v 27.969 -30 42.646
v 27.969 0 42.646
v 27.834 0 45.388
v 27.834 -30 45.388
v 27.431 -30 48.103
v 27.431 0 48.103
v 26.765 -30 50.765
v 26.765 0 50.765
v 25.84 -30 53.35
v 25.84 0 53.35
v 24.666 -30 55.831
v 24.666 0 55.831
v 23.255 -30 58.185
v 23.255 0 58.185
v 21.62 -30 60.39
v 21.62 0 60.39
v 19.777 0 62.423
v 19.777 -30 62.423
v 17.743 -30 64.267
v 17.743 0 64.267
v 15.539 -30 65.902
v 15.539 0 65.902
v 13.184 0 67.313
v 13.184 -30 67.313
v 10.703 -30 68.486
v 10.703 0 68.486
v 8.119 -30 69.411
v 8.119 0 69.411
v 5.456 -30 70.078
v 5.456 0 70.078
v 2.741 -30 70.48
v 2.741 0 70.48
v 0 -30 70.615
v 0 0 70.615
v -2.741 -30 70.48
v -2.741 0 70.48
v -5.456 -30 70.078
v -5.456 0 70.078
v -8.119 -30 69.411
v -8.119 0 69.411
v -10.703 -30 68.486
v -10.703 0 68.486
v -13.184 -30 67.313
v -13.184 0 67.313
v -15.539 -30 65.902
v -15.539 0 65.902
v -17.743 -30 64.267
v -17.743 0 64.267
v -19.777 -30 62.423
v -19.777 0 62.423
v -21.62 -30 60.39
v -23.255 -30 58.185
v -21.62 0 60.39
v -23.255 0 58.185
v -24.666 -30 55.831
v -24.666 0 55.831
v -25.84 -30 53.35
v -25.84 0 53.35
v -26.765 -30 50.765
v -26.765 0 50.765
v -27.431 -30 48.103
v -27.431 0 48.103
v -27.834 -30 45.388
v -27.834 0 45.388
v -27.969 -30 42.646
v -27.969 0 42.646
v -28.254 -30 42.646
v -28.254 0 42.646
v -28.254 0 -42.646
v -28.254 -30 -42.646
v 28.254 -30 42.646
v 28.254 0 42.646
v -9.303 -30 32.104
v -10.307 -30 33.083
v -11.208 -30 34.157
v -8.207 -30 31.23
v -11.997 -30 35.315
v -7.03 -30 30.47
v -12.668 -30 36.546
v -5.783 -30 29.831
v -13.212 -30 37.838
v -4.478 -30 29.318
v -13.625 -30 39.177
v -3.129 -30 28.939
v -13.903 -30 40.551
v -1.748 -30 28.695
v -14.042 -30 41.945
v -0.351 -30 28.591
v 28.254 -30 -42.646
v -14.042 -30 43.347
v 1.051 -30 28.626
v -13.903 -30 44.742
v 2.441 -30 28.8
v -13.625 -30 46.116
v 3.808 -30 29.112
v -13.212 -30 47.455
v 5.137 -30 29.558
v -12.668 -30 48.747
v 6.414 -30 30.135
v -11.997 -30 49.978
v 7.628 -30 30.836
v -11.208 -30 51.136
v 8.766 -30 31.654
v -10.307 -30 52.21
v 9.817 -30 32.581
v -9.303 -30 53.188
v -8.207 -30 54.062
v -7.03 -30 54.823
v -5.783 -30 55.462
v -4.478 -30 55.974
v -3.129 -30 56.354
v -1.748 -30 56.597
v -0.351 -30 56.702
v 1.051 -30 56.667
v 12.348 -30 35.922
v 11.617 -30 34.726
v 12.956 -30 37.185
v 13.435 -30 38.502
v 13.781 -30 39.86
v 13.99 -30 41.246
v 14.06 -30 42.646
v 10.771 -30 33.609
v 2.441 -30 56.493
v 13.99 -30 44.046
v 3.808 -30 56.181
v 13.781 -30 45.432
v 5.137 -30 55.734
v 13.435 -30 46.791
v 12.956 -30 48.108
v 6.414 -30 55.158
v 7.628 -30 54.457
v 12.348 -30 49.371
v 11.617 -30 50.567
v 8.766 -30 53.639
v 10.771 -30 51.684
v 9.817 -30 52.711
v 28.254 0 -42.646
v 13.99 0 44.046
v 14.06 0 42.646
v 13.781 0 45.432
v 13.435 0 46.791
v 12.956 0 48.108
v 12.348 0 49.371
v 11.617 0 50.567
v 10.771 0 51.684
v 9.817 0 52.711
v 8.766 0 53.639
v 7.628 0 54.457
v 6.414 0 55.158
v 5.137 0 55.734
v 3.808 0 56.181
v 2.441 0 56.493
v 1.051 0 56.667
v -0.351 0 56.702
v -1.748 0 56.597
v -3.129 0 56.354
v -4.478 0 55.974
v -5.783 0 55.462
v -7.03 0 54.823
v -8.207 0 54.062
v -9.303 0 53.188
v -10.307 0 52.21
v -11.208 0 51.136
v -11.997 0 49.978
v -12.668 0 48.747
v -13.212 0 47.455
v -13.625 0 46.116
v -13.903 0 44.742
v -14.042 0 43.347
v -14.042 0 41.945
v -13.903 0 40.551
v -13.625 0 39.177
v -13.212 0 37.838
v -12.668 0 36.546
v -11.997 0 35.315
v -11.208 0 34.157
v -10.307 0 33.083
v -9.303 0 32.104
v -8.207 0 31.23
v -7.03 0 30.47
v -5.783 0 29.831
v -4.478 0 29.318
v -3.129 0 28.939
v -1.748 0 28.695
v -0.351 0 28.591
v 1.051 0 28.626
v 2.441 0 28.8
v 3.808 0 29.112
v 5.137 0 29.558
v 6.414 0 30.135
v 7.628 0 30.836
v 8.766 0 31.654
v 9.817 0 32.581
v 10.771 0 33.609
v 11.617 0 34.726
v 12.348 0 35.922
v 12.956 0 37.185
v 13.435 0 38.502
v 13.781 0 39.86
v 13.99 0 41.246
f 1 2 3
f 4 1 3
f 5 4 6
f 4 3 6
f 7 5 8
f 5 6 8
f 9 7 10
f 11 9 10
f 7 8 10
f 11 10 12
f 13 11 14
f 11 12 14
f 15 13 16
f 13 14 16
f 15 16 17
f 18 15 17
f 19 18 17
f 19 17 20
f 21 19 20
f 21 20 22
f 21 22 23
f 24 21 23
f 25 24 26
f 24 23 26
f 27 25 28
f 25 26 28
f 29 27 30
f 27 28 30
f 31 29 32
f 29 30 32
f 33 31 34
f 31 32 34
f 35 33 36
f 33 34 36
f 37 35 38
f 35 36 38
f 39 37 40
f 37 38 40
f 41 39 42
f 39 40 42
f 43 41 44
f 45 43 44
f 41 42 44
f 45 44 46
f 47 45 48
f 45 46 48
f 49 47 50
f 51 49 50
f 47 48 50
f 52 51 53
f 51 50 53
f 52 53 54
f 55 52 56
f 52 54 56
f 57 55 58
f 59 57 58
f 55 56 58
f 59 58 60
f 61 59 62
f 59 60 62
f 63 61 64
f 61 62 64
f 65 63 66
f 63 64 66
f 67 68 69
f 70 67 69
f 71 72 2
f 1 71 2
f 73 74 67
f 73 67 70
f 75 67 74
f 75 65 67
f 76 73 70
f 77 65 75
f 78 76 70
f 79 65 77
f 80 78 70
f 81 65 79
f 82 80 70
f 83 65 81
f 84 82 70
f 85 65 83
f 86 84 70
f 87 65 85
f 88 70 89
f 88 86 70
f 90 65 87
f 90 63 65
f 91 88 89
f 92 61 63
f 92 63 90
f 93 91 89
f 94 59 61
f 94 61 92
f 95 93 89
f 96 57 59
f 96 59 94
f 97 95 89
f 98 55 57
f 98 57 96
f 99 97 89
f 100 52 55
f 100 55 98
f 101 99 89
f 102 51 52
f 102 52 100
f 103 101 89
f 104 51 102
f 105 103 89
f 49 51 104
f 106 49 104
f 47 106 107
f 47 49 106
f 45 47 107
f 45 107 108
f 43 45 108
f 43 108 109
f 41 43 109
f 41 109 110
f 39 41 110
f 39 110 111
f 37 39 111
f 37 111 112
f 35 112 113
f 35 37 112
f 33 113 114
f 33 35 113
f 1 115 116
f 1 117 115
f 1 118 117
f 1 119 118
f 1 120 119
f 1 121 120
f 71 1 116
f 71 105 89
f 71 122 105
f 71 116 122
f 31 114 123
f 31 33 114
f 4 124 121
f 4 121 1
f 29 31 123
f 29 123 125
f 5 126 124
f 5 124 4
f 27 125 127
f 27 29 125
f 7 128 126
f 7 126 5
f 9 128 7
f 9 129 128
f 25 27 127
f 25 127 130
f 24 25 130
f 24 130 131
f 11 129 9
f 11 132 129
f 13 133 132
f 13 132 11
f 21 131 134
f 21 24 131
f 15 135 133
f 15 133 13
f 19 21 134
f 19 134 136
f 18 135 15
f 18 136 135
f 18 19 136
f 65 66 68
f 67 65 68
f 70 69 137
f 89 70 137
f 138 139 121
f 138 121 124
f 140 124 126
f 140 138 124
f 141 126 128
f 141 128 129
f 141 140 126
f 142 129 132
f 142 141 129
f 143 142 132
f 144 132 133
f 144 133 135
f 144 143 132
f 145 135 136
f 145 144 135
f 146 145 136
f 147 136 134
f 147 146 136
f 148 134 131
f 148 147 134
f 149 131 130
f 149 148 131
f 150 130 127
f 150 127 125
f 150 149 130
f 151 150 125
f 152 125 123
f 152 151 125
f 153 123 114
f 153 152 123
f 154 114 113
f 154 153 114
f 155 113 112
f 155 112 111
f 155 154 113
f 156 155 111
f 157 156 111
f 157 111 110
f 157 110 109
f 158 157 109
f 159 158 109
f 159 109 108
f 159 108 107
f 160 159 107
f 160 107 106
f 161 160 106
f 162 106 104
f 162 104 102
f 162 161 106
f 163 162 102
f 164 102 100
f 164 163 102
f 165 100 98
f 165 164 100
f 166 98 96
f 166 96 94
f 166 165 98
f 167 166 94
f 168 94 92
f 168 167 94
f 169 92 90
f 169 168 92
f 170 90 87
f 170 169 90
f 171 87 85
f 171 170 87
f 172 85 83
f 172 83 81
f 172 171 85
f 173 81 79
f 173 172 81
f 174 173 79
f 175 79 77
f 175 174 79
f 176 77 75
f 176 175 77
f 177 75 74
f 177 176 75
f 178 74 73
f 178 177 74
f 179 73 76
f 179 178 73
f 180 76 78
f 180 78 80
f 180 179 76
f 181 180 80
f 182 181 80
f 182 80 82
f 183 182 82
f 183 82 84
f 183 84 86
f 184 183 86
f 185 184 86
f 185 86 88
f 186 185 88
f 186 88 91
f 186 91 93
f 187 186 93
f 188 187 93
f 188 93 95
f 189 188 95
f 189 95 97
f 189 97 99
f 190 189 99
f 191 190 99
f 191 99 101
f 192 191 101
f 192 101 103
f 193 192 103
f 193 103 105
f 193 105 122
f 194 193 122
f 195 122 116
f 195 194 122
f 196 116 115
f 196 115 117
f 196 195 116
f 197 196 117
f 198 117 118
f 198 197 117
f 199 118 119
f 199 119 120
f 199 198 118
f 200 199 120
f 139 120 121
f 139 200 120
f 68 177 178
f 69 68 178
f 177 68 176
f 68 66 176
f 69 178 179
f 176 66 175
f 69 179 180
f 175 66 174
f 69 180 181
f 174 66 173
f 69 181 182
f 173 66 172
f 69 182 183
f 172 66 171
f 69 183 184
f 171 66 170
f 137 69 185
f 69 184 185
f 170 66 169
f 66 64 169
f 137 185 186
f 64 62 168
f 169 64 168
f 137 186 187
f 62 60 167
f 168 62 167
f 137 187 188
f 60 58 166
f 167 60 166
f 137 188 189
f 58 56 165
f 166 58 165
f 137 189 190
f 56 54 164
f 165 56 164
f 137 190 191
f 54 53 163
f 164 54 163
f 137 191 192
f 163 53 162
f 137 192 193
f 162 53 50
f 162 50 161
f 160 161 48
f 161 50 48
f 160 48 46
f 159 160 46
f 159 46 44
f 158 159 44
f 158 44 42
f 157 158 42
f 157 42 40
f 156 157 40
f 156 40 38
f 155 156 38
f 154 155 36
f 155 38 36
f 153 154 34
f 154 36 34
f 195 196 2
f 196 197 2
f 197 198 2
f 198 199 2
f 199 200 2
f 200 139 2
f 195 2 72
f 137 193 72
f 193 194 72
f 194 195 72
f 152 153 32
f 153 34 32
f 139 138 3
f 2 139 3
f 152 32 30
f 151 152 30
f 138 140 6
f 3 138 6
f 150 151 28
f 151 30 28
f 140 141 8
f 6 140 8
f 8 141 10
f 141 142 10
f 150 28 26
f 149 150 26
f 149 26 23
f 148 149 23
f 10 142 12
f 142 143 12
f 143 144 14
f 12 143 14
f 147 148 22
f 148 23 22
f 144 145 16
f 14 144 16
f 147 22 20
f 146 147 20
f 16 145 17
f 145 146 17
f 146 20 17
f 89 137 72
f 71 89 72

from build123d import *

# Parameters (mm, degrees)
F0_R     = 14.059963
F1_DEPTH = 30


with BuildPart() as f1:
    # F0 (on Front) → F1 (new body)
    with BuildSketch(Plane.XZ):
        with BuildLine():
            Line((28.253531, -42.646307), (28.253531, 42.646307))
            Line((28.253531, 42.646307), (27.968869, 42.646307))
            ThreePointArc((27.968869, 42.646307), (0, 70.615176), (-27.968869, 42.646307))
            Line((-27.968869, 42.646307), (-28.253531, 42.646307))
            Line((-28.253531, 42.646307), (-28.253531, -42.646307))
            Line((-28.253531, -42.646307), (28.253531, -42.646307))
        make_face()
        with Locations((0, 42.646307)):
            Circle(F0_R, mode=Mode.SUBTRACT)
    extrude(amount=F1_DEPTH)


solid = f1.part
